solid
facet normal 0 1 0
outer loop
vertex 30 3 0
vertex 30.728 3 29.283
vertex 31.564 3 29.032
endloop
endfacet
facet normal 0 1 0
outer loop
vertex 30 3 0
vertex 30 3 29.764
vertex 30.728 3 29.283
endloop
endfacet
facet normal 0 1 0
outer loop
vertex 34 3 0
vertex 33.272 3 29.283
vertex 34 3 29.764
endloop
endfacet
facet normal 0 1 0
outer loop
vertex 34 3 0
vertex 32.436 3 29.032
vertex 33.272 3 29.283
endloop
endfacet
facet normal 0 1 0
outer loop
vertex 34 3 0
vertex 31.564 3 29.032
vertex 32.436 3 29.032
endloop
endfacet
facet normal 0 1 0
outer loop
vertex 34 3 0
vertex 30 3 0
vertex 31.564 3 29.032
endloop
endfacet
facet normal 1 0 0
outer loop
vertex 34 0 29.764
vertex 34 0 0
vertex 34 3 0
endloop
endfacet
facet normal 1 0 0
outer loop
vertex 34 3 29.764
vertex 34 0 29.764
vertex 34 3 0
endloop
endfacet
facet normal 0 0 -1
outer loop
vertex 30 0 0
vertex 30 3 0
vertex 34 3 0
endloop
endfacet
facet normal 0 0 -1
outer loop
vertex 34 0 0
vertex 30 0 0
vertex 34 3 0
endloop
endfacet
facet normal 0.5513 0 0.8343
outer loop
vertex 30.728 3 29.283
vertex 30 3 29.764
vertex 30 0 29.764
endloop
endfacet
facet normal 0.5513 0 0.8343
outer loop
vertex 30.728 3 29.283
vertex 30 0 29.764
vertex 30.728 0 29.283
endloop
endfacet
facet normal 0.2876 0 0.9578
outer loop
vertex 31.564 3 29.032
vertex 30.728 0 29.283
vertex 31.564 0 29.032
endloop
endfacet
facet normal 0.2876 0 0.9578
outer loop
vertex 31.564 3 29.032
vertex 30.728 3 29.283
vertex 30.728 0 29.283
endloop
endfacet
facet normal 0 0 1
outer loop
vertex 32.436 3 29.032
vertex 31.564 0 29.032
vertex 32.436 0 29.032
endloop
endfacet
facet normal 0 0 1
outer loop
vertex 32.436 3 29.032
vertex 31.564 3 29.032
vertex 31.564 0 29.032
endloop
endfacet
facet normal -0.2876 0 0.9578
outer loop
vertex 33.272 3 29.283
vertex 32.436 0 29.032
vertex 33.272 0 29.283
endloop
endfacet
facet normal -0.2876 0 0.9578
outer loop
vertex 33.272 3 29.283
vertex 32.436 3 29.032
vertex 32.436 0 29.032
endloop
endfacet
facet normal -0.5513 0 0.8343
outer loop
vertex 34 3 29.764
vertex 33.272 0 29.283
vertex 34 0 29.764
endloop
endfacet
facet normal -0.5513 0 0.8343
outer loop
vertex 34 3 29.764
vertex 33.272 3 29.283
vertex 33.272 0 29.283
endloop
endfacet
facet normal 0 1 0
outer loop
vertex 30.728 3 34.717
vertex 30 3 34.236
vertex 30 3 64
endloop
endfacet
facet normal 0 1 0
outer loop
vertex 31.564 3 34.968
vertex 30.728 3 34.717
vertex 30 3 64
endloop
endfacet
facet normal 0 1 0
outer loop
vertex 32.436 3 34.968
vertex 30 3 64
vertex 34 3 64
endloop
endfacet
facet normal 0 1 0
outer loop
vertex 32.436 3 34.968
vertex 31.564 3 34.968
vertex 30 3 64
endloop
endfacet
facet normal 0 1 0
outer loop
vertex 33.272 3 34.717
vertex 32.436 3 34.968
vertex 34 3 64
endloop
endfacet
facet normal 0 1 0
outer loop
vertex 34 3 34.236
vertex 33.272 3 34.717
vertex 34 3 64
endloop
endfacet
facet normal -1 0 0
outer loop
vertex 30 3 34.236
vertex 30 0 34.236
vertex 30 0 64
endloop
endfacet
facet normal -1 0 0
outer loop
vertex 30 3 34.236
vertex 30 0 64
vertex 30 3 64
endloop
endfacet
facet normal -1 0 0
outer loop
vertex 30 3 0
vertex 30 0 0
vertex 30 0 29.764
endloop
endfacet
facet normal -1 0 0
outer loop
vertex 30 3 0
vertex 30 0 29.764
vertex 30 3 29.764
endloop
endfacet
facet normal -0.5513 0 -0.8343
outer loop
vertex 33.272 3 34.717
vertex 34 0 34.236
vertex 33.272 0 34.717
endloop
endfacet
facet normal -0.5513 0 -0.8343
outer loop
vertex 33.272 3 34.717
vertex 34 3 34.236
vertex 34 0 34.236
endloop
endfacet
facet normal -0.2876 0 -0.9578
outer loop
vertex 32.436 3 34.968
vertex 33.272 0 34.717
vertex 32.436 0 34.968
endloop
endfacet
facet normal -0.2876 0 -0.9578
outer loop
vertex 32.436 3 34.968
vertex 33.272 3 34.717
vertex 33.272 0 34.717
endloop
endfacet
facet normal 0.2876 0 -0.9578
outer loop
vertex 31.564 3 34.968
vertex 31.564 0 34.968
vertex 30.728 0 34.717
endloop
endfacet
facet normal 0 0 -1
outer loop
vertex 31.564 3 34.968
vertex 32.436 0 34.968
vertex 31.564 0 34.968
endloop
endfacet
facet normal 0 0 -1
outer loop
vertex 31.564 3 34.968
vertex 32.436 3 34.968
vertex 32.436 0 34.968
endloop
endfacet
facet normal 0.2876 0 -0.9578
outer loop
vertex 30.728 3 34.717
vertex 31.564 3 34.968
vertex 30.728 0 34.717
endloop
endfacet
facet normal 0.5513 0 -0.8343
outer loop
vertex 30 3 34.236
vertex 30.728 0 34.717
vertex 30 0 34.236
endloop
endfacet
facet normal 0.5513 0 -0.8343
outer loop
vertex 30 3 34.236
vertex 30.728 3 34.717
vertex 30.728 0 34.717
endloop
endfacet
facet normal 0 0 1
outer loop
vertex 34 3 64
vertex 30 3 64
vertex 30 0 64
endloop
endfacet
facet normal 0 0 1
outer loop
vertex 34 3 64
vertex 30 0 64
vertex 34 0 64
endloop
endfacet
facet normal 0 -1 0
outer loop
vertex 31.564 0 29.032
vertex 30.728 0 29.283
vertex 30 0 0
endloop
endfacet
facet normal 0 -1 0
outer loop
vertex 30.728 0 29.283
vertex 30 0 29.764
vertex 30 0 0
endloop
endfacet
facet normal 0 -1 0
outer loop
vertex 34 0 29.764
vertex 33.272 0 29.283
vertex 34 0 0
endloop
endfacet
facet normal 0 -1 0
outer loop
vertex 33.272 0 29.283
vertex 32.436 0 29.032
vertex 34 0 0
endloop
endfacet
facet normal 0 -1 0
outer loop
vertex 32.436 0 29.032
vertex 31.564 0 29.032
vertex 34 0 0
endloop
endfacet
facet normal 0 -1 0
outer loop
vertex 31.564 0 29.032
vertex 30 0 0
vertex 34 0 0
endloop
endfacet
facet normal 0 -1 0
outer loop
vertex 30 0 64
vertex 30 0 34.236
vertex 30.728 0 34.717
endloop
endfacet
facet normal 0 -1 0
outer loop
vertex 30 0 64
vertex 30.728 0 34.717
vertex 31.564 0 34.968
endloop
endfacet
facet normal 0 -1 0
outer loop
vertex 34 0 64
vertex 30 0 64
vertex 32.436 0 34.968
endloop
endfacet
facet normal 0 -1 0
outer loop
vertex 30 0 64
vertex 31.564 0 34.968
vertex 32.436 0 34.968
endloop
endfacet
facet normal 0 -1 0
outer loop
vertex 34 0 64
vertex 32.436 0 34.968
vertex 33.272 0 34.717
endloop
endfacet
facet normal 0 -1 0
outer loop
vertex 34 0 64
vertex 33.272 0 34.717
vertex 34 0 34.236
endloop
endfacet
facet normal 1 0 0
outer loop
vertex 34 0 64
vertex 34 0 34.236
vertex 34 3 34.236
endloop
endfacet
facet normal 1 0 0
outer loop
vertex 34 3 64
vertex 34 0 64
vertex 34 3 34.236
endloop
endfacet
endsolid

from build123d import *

# Parameters (mm, degrees)
CYLINDER868_R     = 3
CYLINDER868_DEPTH = 10
BOX419_W          = 4
BOX419_H          = 3
BOX419_DEPTH      = 64


with BuildPart() as v_lec868:
    # Cylinder868 → Cylinder868 (new body)
    with BuildSketch(Plane(origin=(32, 5, 32), x_dir=(1, 0, 0), z_dir=(0, -1, 0))):
        Circle(CYLINDER868_R)
    extrude(amount=CYLINDER868_DEPTH)


with BuildPart() as cut017:
    # Box419 → Box419 (new body)
    with BuildSketch(Plane(origin=(30, 0, 0), x_dir=(1, 0, 0), z_dir=(0, 0, 1))):
        with Locations((2, 1.5)):
            Rectangle(BOX419_W, BOX419_H)
    extrude(amount=BOX419_DEPTH)

    # Cut017: cut Válec868
    add(v_lec868.part, mode=Mode.SUBTRACT)


solid = cut017.part
